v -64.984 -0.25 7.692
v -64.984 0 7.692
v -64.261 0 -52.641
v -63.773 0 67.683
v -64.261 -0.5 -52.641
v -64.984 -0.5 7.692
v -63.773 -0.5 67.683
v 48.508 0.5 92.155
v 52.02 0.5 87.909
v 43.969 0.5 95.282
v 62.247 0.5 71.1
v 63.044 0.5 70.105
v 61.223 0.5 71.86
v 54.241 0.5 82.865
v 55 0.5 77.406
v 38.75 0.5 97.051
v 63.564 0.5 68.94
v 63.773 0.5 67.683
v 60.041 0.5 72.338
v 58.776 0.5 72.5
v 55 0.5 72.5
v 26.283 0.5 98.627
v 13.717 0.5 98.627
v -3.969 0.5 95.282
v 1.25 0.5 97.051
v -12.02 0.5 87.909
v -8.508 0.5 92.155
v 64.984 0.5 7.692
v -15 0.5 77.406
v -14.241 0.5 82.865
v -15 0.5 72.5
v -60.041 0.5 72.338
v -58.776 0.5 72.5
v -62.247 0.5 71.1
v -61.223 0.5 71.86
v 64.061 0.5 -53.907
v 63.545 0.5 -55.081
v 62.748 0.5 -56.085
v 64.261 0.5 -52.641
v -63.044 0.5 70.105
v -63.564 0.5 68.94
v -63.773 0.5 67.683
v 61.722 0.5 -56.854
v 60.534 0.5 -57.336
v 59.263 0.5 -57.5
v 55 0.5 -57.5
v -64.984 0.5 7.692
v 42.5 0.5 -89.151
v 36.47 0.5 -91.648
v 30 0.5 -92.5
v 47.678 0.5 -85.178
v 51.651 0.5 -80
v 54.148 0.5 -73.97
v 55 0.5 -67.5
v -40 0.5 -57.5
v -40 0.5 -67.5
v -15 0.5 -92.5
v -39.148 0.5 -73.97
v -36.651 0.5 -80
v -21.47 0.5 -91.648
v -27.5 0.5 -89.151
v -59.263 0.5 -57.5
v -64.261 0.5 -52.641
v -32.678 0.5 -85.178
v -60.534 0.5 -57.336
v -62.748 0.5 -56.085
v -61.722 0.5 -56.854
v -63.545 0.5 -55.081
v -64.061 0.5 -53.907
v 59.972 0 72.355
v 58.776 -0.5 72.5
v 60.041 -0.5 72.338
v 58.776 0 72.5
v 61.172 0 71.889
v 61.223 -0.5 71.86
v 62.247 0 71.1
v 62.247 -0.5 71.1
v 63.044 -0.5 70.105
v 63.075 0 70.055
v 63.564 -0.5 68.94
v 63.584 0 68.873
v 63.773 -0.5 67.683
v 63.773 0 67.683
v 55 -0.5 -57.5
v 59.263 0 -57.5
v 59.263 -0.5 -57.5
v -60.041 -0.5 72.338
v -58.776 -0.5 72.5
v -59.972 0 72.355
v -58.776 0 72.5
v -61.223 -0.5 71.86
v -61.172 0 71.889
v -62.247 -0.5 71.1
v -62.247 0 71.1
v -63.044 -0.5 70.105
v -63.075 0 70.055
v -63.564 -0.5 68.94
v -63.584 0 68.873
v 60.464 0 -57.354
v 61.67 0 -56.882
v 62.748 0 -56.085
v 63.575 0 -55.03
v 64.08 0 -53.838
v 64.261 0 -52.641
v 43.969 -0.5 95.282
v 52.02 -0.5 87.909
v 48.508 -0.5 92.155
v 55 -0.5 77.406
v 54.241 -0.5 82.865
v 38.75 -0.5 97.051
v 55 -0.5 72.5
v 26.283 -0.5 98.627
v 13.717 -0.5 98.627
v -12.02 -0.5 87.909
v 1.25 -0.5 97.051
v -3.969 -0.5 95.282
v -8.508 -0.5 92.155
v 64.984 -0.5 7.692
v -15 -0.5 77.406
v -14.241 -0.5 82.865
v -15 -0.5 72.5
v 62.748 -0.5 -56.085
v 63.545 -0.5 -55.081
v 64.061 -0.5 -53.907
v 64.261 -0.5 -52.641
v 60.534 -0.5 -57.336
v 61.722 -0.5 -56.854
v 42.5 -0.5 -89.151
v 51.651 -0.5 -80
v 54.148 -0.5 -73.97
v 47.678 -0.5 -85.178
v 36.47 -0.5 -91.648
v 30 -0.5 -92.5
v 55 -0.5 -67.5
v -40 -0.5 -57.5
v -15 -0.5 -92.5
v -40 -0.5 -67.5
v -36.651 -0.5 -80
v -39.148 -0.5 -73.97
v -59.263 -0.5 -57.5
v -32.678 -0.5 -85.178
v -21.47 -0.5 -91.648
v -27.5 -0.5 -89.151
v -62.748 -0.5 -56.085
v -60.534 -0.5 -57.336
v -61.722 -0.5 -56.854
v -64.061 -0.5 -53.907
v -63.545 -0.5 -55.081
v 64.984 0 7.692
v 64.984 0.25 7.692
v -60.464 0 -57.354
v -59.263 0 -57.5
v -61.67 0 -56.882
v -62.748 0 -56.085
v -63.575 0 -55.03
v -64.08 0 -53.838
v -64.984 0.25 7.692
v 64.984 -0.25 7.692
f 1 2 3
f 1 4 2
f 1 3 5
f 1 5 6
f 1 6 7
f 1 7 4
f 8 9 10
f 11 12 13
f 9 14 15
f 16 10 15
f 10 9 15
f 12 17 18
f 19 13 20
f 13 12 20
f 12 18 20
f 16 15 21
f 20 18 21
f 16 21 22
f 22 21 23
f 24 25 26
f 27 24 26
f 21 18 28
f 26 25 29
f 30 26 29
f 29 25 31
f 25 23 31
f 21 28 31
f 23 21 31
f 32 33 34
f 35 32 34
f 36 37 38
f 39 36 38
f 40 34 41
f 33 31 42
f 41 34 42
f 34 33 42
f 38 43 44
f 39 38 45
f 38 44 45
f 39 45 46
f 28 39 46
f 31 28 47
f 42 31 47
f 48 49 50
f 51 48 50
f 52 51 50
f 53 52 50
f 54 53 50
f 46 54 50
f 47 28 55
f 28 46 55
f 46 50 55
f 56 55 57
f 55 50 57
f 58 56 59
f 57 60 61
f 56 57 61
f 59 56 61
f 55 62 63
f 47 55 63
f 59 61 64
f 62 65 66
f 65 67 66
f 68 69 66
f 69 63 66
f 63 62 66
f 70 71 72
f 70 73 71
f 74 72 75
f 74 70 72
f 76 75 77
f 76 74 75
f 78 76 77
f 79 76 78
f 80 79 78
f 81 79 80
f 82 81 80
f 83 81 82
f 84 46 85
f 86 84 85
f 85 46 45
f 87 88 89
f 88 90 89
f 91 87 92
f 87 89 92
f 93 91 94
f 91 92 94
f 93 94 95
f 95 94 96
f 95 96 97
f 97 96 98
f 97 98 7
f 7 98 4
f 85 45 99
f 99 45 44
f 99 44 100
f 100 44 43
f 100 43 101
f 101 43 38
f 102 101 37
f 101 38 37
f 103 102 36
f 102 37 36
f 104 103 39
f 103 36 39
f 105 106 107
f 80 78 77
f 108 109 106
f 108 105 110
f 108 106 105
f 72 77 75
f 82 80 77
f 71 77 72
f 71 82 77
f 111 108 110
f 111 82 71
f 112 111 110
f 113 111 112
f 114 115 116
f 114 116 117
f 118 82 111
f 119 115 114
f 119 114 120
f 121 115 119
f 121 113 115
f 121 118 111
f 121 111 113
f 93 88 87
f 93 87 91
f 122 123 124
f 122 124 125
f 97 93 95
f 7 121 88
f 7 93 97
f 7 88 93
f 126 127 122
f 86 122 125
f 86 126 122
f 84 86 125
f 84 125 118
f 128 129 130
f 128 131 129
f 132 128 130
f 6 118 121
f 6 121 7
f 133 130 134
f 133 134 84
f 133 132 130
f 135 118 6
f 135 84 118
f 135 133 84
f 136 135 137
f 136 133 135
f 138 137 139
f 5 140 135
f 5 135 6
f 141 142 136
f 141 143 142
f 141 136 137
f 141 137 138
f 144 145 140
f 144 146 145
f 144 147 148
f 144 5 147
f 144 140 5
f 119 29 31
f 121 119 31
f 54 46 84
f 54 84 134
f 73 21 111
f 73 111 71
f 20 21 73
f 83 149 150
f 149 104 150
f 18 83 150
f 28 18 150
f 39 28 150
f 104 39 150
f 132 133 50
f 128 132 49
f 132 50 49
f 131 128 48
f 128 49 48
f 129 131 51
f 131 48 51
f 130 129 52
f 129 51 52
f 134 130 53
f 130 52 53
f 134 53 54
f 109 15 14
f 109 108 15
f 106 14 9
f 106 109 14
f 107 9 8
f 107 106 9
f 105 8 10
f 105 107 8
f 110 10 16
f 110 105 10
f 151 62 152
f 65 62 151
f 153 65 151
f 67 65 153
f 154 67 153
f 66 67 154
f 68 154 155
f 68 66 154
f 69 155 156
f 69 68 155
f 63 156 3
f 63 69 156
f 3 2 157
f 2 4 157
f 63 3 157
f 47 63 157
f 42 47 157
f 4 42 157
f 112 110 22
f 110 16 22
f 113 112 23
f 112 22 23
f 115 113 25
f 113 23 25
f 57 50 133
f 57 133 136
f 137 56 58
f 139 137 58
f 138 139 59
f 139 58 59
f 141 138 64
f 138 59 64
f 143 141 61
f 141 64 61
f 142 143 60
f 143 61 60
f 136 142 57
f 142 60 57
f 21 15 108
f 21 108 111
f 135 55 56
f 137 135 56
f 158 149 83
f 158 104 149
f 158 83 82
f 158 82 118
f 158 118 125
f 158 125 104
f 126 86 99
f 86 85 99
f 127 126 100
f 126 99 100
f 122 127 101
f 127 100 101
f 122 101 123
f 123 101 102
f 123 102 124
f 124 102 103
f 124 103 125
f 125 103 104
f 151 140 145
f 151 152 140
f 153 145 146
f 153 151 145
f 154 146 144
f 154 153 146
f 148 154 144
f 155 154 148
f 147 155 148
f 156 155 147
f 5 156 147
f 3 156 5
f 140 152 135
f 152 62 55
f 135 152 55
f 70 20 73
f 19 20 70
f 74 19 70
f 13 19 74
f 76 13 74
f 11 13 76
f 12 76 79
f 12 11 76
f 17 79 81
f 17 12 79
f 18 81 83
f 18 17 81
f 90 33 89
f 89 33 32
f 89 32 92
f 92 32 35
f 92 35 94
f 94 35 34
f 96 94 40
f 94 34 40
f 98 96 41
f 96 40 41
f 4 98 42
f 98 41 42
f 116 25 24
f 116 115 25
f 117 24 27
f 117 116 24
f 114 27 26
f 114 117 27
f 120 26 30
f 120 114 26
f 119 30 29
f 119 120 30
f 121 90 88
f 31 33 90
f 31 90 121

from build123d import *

# Parameters (mm, degrees)
EXTRUDE_1_DEPTH     = 0.5
SKETCH_3_W          = 25
SKETCH_3_H          = 35
CUT_EXTRUDE_1_DEPTH = 114.058613257
SKETCH_4_W          = 10
SKETCH_4_H          = 35
CUT_EXTRUDE_2_DEPTH = 114.058613257
SKETCH_5_W          = 50
SKETCH_5_H          = 20
CUT_EXTRUDE_3_DEPTH = 114.058613257
SKETCH_6_W          = 10
SKETCH_6_H          = 20
CUT_EXTRUDE_4_DEPTH = 114.058613257
EXTRUDE_2_DEPTH     = 0.5
CUT_EXTRUDE_5_DEPTH = 119.289418767
FILLET_1_R          = 5
FILLET_2_R          = 20


with BuildPart() as part:
    # ｽｹｯﾁ1 → ﾎﾞｽ - 押し出し1 (new, symmetric)
    with BuildSketch(Plane(origin=(0, 0, 0), x_dir=(1, 0, 0), z_dir=(0, 1, 0))):
        with BuildLine():
            Line((62.68888804, 92.5), (-62.68888804, 92.5))
            add(Edge.make_bspline(
                [(-62.68888804, 92.5), (-67.396314277, 0), (-62.68888804, -92.5)],
                knots=[4.444925752, 4.444925752, 4.444925752, 4.979852209, 4.979852209, 4.979852209], degree=2, weights=[1, 0.964444431, 1]))
            Line((-62.68888804, -92.5), (62.68888804, -92.5))
            add(Edge.make_bspline(
                [(62.68888804, -92.5), (67.396314277, 0), (62.68888804, 92.5)],
                knots=[1.303333099, 1.303333099, 1.303333099, 1.838259555, 1.838259555, 1.838259555], degree=2, weights=[1, 0.964444431, 1]))
        make_face()
    extrude(amount=EXTRUDE_1_DEPTH, both=True)

    # ｽｹｯﾁ3 → ｶｯﾄ - 押し出し1 (cut, through all)
    with BuildSketch(Plane(origin=(0, 0.5, 0), x_dir=(1, 0, 0), z_dir=(0, 1, 0))):
        with Locations((-52.5, 75)):
            Rectangle(SKETCH_3_W, SKETCH_3_H)
    extrude(amount=-CUT_EXTRUDE_1_DEPTH, mode=Mode.SUBTRACT)

    # ｽｹｯﾁ4 → ｶｯﾄ - 押し出し2 (cut, through all)
    with BuildSketch(Plane(origin=(0, 0.5, 0), x_dir=(1, 0, 0), z_dir=(0, 1, 0))):
        with Locations((60, 75)):
            Rectangle(SKETCH_4_W, SKETCH_4_H)
    extrude(amount=-CUT_EXTRUDE_2_DEPTH, mode=Mode.SUBTRACT)

    # ｽｹｯﾁ5 → ｶｯﾄ - 押し出し3 (cut, through all)
    with BuildSketch(Plane(origin=(0, 0.5, 0), x_dir=(1, 0, 0), z_dir=(0, 1, 0))):
        with Locations((-40, -82.5)):
            Rectangle(SKETCH_5_W, SKETCH_5_H)
    extrude(amount=-CUT_EXTRUDE_3_DEPTH, mode=Mode.SUBTRACT)

    # ｽｹｯﾁ6 → ｶｯﾄ - 押し出し4 (cut, through all)
    with BuildSketch(Plane(origin=(0, 0.5, 0), x_dir=(1, 0, 0), z_dir=(0, 1, 0))):
        with Locations((60, -82.5)):
            Rectangle(SKETCH_6_W, SKETCH_6_H)
    extrude(amount=-CUT_EXTRUDE_4_DEPTH, mode=Mode.SUBTRACT)

    # ｽｹｯﾁ7 → ﾎﾞｽ - 押し出し2 (add, symmetric)
    with BuildSketch(Plane(origin=(0, 0, 0), x_dir=(1, 0, 0), z_dir=(0, 1, 0))):
        with BuildLine():
            Line((-15, -92.5), (55, -92.5))
            ThreePointArc((55, -92.5), (20, -98.825030024), (-15, -92.5))
        make_face()
    extrude(amount=EXTRUDE_2_DEPTH, both=True)

    # ｽｹｯﾁ8 → ｶｯﾄ - 押し出し5 (cut, through all)
    with BuildSketch(Plane(origin=(0, 0.5, 0), x_dir=(1, 0, 0), z_dir=(0, 1, 0))):
        with BuildLine():
            ThreePointArc((-40, 67.5), (-32.677669545, 85.177669514), (-15.000000044, 92.5))
            Line((-15.000000044, 92.5), (-40, 92.5))
            Line((-40, 92.5), (-40, 67.5))
        make_face()
        with BuildLine():
            Line((55, 67.5), (55, 92.5))
            Line((55, 92.5), (30, 92.5))
            ThreePointArc((30, 92.5), (47.67766953, 85.17766953), (55, 67.5))
        make_face()
    extrude(amount=-CUT_EXTRUDE_5_DEPTH, mode=Mode.SUBTRACT)

    # ﾌｨﾚｯﾄ1
    fillet_1_edges = [part.edges().sort_by_distance(p)[0] for p in [
        (-64.116831739, -0.25, -57.5),
        (-63.590195865, -0.25, 72.5),
        (63.590195865, -0.2499997, 72.5),
        (64.116831739, -0.25, -57.5),
    ]]
    fillet(fillet_1_edges, radius=FILLET_1_R)

    # ﾌｨﾚｯﾄ2
    fillet_2_edges = [part.edges().sort_by_distance(p)[0] for p in [
        (-15, 0, 92.5),
        (55, 0, 92.5),
    ]]
    fillet(fillet_2_edges, radius=FILLET_2_R)


solid = part.part
